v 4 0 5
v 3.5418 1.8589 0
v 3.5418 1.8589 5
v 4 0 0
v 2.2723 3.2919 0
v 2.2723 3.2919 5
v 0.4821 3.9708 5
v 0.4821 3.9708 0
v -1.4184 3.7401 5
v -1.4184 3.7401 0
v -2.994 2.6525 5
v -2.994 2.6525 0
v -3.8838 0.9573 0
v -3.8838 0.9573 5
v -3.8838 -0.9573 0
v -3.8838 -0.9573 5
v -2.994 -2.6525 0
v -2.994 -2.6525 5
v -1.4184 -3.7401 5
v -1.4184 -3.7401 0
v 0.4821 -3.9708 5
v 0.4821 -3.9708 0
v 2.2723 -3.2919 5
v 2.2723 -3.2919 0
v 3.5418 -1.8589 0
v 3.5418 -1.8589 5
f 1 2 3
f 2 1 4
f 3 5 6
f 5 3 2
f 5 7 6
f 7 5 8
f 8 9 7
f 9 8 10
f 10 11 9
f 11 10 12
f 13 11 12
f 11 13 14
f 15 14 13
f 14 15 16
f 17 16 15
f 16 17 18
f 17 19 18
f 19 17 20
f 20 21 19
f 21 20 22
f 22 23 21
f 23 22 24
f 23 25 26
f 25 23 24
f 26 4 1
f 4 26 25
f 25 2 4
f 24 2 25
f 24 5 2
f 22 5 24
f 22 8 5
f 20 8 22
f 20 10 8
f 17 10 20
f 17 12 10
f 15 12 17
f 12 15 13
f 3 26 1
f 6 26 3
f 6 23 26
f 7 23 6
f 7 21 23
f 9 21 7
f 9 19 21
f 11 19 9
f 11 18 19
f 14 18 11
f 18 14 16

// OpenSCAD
// Generated by generate_scads.py
scale([1.0,1.0,1.0]) {
  cylinder(h=5, r=4, center=false);
}
